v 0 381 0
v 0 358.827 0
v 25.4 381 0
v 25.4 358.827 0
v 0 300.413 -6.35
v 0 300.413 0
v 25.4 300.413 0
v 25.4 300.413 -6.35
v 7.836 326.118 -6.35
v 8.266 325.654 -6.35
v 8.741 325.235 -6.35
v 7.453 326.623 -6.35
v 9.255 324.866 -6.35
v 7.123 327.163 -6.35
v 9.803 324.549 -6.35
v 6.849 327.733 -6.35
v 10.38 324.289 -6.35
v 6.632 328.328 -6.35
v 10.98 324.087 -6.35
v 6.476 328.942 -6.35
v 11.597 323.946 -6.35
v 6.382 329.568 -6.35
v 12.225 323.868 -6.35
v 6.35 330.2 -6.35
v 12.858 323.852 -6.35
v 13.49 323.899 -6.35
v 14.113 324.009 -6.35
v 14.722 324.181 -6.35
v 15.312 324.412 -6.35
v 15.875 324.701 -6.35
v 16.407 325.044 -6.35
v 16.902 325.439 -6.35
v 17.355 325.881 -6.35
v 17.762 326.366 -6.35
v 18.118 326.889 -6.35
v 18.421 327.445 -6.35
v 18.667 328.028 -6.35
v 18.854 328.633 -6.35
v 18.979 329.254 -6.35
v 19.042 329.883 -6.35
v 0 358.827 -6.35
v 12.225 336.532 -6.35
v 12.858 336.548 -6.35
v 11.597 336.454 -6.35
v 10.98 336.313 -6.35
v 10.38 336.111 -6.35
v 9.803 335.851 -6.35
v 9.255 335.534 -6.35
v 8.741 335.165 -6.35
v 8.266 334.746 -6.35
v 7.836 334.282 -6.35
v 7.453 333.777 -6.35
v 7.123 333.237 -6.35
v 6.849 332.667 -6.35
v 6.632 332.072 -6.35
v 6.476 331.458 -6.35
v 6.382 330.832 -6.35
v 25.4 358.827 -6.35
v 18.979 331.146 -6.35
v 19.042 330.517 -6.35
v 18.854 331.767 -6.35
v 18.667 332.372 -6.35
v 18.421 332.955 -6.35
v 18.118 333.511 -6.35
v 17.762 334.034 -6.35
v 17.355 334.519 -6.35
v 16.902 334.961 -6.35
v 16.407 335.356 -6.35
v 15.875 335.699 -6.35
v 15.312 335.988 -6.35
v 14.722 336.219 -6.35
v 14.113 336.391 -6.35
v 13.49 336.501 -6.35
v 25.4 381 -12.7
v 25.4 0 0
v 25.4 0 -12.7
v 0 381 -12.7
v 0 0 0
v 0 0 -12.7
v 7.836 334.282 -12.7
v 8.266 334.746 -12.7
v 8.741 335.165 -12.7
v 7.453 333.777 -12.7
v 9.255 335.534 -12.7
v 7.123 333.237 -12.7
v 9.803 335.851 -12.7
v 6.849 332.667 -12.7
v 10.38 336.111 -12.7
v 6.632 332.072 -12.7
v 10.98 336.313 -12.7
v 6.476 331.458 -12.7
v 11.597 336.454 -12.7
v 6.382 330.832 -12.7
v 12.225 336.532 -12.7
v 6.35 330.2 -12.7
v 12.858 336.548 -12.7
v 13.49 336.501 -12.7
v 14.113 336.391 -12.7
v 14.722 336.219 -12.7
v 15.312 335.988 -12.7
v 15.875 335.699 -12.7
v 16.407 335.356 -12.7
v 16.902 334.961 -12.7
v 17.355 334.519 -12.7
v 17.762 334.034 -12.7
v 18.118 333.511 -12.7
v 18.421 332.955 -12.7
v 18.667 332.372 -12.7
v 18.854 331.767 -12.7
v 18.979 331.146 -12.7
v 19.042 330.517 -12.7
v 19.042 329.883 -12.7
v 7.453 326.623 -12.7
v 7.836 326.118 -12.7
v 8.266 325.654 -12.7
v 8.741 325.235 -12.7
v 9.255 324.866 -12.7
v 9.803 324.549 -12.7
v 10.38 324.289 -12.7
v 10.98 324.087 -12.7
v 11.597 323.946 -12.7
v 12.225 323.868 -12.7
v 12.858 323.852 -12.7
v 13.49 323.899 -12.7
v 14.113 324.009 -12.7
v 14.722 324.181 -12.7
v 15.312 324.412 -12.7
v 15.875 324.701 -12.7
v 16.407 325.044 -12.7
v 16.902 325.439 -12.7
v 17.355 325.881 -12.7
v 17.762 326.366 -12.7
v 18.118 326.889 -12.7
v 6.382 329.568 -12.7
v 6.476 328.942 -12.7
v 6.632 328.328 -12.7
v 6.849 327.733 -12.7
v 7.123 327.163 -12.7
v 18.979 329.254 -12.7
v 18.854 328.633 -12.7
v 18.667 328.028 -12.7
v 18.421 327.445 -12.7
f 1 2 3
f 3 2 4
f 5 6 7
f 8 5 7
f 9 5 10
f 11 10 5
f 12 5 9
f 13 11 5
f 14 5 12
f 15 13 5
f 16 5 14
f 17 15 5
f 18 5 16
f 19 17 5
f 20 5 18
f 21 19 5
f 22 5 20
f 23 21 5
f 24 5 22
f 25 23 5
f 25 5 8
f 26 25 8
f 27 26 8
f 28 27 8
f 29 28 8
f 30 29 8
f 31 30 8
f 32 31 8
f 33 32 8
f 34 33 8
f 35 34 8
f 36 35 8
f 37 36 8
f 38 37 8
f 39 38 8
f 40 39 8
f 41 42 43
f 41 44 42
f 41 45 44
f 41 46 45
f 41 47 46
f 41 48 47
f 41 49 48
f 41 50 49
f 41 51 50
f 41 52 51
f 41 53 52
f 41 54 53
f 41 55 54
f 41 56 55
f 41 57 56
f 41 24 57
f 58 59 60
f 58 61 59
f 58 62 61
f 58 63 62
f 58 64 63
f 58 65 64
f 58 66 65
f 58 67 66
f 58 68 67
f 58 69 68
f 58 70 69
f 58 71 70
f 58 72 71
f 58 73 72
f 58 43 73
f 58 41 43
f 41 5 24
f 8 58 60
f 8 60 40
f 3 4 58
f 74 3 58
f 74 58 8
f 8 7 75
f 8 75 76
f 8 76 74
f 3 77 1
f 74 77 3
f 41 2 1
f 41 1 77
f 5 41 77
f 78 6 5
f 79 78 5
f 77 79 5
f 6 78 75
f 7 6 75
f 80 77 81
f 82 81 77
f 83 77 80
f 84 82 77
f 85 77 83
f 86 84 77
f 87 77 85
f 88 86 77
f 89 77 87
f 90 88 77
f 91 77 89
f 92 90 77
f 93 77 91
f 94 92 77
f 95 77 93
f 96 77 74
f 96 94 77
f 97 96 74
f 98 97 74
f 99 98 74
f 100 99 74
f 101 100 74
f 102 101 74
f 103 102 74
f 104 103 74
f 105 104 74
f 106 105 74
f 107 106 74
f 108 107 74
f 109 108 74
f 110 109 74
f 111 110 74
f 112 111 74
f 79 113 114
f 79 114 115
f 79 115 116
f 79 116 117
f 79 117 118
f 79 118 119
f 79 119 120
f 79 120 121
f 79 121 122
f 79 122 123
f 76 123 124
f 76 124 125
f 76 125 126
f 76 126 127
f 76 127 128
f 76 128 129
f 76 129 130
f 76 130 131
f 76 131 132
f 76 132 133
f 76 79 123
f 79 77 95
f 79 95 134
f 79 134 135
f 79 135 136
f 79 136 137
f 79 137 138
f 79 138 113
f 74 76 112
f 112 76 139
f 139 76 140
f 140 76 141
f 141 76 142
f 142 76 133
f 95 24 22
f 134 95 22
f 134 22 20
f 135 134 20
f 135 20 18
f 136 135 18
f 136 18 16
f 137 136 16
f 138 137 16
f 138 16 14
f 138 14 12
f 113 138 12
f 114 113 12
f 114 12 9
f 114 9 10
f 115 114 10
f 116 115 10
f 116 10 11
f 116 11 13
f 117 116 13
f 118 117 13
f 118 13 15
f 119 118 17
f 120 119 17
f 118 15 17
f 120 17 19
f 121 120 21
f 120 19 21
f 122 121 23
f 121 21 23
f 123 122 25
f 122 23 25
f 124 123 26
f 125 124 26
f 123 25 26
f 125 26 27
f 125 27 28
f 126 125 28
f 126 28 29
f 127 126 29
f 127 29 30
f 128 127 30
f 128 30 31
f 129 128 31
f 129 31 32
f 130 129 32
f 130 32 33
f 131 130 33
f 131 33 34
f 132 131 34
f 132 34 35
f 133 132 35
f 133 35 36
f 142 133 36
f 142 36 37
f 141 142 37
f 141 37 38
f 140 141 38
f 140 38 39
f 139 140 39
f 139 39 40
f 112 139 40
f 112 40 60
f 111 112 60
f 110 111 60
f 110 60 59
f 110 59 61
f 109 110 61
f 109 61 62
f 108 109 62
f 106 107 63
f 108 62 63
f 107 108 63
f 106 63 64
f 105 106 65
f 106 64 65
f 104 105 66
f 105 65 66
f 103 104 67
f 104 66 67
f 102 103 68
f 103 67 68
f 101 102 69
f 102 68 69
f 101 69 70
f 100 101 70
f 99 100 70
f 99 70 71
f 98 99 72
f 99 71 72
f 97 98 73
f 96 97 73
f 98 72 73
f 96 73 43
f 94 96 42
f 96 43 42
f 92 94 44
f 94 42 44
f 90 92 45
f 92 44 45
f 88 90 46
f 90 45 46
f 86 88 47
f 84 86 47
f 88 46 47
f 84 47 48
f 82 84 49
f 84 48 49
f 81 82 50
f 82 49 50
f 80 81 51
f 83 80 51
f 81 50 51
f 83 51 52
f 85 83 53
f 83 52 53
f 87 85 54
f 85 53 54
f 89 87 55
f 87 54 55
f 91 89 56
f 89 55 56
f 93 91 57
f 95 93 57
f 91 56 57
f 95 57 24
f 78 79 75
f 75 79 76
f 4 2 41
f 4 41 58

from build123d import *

# Parameters (mm, degrees)
SKETCH1_W           = 25.4
SKETCH1_H           = 12.7
BOSS_EXTRUDE1_DEPTH = 381
SKETCH2_R           = 6.35
CUT_EXTRUDE1_DEPTH  = 383.056867495
SKETCH3_W           = 25.4
SKETCH3_H           = 58.414427835
CUT_EXTRUDE2_DEPTH  = 6.35


with BuildPart() as part:
    # Sketch1 → Boss-Extrude1 (new body)
    with BuildSketch(Plane(origin=(0, 0, 0), x_dir=(1, 0, 0), z_dir=(0, 1, 0))):
        with Locations((12.7, 6.35)):
            Rectangle(SKETCH1_W, SKETCH1_H)
    extrude(amount=BOSS_EXTRUDE1_DEPTH)

    # Sketch2 → Cut-Extrude1 (cut, through all)
    with BuildSketch(Plane.XY):
        with Locations(Location((12.7, 330.2, 0), (0, 0, 180))):
            Circle(SKETCH2_R)
    extrude(amount=-CUT_EXTRUDE1_DEPTH, mode=Mode.SUBTRACT)

    # Sketch3 → Cut-Extrude2 (cut)
    with BuildSketch(Plane.XY):
        with Locations((12.7, 329.619745597)):
            Rectangle(SKETCH3_W, SKETCH3_H)
    extrude(amount=-CUT_EXTRUDE2_DEPTH, mode=Mode.SUBTRACT)


solid = part.part
